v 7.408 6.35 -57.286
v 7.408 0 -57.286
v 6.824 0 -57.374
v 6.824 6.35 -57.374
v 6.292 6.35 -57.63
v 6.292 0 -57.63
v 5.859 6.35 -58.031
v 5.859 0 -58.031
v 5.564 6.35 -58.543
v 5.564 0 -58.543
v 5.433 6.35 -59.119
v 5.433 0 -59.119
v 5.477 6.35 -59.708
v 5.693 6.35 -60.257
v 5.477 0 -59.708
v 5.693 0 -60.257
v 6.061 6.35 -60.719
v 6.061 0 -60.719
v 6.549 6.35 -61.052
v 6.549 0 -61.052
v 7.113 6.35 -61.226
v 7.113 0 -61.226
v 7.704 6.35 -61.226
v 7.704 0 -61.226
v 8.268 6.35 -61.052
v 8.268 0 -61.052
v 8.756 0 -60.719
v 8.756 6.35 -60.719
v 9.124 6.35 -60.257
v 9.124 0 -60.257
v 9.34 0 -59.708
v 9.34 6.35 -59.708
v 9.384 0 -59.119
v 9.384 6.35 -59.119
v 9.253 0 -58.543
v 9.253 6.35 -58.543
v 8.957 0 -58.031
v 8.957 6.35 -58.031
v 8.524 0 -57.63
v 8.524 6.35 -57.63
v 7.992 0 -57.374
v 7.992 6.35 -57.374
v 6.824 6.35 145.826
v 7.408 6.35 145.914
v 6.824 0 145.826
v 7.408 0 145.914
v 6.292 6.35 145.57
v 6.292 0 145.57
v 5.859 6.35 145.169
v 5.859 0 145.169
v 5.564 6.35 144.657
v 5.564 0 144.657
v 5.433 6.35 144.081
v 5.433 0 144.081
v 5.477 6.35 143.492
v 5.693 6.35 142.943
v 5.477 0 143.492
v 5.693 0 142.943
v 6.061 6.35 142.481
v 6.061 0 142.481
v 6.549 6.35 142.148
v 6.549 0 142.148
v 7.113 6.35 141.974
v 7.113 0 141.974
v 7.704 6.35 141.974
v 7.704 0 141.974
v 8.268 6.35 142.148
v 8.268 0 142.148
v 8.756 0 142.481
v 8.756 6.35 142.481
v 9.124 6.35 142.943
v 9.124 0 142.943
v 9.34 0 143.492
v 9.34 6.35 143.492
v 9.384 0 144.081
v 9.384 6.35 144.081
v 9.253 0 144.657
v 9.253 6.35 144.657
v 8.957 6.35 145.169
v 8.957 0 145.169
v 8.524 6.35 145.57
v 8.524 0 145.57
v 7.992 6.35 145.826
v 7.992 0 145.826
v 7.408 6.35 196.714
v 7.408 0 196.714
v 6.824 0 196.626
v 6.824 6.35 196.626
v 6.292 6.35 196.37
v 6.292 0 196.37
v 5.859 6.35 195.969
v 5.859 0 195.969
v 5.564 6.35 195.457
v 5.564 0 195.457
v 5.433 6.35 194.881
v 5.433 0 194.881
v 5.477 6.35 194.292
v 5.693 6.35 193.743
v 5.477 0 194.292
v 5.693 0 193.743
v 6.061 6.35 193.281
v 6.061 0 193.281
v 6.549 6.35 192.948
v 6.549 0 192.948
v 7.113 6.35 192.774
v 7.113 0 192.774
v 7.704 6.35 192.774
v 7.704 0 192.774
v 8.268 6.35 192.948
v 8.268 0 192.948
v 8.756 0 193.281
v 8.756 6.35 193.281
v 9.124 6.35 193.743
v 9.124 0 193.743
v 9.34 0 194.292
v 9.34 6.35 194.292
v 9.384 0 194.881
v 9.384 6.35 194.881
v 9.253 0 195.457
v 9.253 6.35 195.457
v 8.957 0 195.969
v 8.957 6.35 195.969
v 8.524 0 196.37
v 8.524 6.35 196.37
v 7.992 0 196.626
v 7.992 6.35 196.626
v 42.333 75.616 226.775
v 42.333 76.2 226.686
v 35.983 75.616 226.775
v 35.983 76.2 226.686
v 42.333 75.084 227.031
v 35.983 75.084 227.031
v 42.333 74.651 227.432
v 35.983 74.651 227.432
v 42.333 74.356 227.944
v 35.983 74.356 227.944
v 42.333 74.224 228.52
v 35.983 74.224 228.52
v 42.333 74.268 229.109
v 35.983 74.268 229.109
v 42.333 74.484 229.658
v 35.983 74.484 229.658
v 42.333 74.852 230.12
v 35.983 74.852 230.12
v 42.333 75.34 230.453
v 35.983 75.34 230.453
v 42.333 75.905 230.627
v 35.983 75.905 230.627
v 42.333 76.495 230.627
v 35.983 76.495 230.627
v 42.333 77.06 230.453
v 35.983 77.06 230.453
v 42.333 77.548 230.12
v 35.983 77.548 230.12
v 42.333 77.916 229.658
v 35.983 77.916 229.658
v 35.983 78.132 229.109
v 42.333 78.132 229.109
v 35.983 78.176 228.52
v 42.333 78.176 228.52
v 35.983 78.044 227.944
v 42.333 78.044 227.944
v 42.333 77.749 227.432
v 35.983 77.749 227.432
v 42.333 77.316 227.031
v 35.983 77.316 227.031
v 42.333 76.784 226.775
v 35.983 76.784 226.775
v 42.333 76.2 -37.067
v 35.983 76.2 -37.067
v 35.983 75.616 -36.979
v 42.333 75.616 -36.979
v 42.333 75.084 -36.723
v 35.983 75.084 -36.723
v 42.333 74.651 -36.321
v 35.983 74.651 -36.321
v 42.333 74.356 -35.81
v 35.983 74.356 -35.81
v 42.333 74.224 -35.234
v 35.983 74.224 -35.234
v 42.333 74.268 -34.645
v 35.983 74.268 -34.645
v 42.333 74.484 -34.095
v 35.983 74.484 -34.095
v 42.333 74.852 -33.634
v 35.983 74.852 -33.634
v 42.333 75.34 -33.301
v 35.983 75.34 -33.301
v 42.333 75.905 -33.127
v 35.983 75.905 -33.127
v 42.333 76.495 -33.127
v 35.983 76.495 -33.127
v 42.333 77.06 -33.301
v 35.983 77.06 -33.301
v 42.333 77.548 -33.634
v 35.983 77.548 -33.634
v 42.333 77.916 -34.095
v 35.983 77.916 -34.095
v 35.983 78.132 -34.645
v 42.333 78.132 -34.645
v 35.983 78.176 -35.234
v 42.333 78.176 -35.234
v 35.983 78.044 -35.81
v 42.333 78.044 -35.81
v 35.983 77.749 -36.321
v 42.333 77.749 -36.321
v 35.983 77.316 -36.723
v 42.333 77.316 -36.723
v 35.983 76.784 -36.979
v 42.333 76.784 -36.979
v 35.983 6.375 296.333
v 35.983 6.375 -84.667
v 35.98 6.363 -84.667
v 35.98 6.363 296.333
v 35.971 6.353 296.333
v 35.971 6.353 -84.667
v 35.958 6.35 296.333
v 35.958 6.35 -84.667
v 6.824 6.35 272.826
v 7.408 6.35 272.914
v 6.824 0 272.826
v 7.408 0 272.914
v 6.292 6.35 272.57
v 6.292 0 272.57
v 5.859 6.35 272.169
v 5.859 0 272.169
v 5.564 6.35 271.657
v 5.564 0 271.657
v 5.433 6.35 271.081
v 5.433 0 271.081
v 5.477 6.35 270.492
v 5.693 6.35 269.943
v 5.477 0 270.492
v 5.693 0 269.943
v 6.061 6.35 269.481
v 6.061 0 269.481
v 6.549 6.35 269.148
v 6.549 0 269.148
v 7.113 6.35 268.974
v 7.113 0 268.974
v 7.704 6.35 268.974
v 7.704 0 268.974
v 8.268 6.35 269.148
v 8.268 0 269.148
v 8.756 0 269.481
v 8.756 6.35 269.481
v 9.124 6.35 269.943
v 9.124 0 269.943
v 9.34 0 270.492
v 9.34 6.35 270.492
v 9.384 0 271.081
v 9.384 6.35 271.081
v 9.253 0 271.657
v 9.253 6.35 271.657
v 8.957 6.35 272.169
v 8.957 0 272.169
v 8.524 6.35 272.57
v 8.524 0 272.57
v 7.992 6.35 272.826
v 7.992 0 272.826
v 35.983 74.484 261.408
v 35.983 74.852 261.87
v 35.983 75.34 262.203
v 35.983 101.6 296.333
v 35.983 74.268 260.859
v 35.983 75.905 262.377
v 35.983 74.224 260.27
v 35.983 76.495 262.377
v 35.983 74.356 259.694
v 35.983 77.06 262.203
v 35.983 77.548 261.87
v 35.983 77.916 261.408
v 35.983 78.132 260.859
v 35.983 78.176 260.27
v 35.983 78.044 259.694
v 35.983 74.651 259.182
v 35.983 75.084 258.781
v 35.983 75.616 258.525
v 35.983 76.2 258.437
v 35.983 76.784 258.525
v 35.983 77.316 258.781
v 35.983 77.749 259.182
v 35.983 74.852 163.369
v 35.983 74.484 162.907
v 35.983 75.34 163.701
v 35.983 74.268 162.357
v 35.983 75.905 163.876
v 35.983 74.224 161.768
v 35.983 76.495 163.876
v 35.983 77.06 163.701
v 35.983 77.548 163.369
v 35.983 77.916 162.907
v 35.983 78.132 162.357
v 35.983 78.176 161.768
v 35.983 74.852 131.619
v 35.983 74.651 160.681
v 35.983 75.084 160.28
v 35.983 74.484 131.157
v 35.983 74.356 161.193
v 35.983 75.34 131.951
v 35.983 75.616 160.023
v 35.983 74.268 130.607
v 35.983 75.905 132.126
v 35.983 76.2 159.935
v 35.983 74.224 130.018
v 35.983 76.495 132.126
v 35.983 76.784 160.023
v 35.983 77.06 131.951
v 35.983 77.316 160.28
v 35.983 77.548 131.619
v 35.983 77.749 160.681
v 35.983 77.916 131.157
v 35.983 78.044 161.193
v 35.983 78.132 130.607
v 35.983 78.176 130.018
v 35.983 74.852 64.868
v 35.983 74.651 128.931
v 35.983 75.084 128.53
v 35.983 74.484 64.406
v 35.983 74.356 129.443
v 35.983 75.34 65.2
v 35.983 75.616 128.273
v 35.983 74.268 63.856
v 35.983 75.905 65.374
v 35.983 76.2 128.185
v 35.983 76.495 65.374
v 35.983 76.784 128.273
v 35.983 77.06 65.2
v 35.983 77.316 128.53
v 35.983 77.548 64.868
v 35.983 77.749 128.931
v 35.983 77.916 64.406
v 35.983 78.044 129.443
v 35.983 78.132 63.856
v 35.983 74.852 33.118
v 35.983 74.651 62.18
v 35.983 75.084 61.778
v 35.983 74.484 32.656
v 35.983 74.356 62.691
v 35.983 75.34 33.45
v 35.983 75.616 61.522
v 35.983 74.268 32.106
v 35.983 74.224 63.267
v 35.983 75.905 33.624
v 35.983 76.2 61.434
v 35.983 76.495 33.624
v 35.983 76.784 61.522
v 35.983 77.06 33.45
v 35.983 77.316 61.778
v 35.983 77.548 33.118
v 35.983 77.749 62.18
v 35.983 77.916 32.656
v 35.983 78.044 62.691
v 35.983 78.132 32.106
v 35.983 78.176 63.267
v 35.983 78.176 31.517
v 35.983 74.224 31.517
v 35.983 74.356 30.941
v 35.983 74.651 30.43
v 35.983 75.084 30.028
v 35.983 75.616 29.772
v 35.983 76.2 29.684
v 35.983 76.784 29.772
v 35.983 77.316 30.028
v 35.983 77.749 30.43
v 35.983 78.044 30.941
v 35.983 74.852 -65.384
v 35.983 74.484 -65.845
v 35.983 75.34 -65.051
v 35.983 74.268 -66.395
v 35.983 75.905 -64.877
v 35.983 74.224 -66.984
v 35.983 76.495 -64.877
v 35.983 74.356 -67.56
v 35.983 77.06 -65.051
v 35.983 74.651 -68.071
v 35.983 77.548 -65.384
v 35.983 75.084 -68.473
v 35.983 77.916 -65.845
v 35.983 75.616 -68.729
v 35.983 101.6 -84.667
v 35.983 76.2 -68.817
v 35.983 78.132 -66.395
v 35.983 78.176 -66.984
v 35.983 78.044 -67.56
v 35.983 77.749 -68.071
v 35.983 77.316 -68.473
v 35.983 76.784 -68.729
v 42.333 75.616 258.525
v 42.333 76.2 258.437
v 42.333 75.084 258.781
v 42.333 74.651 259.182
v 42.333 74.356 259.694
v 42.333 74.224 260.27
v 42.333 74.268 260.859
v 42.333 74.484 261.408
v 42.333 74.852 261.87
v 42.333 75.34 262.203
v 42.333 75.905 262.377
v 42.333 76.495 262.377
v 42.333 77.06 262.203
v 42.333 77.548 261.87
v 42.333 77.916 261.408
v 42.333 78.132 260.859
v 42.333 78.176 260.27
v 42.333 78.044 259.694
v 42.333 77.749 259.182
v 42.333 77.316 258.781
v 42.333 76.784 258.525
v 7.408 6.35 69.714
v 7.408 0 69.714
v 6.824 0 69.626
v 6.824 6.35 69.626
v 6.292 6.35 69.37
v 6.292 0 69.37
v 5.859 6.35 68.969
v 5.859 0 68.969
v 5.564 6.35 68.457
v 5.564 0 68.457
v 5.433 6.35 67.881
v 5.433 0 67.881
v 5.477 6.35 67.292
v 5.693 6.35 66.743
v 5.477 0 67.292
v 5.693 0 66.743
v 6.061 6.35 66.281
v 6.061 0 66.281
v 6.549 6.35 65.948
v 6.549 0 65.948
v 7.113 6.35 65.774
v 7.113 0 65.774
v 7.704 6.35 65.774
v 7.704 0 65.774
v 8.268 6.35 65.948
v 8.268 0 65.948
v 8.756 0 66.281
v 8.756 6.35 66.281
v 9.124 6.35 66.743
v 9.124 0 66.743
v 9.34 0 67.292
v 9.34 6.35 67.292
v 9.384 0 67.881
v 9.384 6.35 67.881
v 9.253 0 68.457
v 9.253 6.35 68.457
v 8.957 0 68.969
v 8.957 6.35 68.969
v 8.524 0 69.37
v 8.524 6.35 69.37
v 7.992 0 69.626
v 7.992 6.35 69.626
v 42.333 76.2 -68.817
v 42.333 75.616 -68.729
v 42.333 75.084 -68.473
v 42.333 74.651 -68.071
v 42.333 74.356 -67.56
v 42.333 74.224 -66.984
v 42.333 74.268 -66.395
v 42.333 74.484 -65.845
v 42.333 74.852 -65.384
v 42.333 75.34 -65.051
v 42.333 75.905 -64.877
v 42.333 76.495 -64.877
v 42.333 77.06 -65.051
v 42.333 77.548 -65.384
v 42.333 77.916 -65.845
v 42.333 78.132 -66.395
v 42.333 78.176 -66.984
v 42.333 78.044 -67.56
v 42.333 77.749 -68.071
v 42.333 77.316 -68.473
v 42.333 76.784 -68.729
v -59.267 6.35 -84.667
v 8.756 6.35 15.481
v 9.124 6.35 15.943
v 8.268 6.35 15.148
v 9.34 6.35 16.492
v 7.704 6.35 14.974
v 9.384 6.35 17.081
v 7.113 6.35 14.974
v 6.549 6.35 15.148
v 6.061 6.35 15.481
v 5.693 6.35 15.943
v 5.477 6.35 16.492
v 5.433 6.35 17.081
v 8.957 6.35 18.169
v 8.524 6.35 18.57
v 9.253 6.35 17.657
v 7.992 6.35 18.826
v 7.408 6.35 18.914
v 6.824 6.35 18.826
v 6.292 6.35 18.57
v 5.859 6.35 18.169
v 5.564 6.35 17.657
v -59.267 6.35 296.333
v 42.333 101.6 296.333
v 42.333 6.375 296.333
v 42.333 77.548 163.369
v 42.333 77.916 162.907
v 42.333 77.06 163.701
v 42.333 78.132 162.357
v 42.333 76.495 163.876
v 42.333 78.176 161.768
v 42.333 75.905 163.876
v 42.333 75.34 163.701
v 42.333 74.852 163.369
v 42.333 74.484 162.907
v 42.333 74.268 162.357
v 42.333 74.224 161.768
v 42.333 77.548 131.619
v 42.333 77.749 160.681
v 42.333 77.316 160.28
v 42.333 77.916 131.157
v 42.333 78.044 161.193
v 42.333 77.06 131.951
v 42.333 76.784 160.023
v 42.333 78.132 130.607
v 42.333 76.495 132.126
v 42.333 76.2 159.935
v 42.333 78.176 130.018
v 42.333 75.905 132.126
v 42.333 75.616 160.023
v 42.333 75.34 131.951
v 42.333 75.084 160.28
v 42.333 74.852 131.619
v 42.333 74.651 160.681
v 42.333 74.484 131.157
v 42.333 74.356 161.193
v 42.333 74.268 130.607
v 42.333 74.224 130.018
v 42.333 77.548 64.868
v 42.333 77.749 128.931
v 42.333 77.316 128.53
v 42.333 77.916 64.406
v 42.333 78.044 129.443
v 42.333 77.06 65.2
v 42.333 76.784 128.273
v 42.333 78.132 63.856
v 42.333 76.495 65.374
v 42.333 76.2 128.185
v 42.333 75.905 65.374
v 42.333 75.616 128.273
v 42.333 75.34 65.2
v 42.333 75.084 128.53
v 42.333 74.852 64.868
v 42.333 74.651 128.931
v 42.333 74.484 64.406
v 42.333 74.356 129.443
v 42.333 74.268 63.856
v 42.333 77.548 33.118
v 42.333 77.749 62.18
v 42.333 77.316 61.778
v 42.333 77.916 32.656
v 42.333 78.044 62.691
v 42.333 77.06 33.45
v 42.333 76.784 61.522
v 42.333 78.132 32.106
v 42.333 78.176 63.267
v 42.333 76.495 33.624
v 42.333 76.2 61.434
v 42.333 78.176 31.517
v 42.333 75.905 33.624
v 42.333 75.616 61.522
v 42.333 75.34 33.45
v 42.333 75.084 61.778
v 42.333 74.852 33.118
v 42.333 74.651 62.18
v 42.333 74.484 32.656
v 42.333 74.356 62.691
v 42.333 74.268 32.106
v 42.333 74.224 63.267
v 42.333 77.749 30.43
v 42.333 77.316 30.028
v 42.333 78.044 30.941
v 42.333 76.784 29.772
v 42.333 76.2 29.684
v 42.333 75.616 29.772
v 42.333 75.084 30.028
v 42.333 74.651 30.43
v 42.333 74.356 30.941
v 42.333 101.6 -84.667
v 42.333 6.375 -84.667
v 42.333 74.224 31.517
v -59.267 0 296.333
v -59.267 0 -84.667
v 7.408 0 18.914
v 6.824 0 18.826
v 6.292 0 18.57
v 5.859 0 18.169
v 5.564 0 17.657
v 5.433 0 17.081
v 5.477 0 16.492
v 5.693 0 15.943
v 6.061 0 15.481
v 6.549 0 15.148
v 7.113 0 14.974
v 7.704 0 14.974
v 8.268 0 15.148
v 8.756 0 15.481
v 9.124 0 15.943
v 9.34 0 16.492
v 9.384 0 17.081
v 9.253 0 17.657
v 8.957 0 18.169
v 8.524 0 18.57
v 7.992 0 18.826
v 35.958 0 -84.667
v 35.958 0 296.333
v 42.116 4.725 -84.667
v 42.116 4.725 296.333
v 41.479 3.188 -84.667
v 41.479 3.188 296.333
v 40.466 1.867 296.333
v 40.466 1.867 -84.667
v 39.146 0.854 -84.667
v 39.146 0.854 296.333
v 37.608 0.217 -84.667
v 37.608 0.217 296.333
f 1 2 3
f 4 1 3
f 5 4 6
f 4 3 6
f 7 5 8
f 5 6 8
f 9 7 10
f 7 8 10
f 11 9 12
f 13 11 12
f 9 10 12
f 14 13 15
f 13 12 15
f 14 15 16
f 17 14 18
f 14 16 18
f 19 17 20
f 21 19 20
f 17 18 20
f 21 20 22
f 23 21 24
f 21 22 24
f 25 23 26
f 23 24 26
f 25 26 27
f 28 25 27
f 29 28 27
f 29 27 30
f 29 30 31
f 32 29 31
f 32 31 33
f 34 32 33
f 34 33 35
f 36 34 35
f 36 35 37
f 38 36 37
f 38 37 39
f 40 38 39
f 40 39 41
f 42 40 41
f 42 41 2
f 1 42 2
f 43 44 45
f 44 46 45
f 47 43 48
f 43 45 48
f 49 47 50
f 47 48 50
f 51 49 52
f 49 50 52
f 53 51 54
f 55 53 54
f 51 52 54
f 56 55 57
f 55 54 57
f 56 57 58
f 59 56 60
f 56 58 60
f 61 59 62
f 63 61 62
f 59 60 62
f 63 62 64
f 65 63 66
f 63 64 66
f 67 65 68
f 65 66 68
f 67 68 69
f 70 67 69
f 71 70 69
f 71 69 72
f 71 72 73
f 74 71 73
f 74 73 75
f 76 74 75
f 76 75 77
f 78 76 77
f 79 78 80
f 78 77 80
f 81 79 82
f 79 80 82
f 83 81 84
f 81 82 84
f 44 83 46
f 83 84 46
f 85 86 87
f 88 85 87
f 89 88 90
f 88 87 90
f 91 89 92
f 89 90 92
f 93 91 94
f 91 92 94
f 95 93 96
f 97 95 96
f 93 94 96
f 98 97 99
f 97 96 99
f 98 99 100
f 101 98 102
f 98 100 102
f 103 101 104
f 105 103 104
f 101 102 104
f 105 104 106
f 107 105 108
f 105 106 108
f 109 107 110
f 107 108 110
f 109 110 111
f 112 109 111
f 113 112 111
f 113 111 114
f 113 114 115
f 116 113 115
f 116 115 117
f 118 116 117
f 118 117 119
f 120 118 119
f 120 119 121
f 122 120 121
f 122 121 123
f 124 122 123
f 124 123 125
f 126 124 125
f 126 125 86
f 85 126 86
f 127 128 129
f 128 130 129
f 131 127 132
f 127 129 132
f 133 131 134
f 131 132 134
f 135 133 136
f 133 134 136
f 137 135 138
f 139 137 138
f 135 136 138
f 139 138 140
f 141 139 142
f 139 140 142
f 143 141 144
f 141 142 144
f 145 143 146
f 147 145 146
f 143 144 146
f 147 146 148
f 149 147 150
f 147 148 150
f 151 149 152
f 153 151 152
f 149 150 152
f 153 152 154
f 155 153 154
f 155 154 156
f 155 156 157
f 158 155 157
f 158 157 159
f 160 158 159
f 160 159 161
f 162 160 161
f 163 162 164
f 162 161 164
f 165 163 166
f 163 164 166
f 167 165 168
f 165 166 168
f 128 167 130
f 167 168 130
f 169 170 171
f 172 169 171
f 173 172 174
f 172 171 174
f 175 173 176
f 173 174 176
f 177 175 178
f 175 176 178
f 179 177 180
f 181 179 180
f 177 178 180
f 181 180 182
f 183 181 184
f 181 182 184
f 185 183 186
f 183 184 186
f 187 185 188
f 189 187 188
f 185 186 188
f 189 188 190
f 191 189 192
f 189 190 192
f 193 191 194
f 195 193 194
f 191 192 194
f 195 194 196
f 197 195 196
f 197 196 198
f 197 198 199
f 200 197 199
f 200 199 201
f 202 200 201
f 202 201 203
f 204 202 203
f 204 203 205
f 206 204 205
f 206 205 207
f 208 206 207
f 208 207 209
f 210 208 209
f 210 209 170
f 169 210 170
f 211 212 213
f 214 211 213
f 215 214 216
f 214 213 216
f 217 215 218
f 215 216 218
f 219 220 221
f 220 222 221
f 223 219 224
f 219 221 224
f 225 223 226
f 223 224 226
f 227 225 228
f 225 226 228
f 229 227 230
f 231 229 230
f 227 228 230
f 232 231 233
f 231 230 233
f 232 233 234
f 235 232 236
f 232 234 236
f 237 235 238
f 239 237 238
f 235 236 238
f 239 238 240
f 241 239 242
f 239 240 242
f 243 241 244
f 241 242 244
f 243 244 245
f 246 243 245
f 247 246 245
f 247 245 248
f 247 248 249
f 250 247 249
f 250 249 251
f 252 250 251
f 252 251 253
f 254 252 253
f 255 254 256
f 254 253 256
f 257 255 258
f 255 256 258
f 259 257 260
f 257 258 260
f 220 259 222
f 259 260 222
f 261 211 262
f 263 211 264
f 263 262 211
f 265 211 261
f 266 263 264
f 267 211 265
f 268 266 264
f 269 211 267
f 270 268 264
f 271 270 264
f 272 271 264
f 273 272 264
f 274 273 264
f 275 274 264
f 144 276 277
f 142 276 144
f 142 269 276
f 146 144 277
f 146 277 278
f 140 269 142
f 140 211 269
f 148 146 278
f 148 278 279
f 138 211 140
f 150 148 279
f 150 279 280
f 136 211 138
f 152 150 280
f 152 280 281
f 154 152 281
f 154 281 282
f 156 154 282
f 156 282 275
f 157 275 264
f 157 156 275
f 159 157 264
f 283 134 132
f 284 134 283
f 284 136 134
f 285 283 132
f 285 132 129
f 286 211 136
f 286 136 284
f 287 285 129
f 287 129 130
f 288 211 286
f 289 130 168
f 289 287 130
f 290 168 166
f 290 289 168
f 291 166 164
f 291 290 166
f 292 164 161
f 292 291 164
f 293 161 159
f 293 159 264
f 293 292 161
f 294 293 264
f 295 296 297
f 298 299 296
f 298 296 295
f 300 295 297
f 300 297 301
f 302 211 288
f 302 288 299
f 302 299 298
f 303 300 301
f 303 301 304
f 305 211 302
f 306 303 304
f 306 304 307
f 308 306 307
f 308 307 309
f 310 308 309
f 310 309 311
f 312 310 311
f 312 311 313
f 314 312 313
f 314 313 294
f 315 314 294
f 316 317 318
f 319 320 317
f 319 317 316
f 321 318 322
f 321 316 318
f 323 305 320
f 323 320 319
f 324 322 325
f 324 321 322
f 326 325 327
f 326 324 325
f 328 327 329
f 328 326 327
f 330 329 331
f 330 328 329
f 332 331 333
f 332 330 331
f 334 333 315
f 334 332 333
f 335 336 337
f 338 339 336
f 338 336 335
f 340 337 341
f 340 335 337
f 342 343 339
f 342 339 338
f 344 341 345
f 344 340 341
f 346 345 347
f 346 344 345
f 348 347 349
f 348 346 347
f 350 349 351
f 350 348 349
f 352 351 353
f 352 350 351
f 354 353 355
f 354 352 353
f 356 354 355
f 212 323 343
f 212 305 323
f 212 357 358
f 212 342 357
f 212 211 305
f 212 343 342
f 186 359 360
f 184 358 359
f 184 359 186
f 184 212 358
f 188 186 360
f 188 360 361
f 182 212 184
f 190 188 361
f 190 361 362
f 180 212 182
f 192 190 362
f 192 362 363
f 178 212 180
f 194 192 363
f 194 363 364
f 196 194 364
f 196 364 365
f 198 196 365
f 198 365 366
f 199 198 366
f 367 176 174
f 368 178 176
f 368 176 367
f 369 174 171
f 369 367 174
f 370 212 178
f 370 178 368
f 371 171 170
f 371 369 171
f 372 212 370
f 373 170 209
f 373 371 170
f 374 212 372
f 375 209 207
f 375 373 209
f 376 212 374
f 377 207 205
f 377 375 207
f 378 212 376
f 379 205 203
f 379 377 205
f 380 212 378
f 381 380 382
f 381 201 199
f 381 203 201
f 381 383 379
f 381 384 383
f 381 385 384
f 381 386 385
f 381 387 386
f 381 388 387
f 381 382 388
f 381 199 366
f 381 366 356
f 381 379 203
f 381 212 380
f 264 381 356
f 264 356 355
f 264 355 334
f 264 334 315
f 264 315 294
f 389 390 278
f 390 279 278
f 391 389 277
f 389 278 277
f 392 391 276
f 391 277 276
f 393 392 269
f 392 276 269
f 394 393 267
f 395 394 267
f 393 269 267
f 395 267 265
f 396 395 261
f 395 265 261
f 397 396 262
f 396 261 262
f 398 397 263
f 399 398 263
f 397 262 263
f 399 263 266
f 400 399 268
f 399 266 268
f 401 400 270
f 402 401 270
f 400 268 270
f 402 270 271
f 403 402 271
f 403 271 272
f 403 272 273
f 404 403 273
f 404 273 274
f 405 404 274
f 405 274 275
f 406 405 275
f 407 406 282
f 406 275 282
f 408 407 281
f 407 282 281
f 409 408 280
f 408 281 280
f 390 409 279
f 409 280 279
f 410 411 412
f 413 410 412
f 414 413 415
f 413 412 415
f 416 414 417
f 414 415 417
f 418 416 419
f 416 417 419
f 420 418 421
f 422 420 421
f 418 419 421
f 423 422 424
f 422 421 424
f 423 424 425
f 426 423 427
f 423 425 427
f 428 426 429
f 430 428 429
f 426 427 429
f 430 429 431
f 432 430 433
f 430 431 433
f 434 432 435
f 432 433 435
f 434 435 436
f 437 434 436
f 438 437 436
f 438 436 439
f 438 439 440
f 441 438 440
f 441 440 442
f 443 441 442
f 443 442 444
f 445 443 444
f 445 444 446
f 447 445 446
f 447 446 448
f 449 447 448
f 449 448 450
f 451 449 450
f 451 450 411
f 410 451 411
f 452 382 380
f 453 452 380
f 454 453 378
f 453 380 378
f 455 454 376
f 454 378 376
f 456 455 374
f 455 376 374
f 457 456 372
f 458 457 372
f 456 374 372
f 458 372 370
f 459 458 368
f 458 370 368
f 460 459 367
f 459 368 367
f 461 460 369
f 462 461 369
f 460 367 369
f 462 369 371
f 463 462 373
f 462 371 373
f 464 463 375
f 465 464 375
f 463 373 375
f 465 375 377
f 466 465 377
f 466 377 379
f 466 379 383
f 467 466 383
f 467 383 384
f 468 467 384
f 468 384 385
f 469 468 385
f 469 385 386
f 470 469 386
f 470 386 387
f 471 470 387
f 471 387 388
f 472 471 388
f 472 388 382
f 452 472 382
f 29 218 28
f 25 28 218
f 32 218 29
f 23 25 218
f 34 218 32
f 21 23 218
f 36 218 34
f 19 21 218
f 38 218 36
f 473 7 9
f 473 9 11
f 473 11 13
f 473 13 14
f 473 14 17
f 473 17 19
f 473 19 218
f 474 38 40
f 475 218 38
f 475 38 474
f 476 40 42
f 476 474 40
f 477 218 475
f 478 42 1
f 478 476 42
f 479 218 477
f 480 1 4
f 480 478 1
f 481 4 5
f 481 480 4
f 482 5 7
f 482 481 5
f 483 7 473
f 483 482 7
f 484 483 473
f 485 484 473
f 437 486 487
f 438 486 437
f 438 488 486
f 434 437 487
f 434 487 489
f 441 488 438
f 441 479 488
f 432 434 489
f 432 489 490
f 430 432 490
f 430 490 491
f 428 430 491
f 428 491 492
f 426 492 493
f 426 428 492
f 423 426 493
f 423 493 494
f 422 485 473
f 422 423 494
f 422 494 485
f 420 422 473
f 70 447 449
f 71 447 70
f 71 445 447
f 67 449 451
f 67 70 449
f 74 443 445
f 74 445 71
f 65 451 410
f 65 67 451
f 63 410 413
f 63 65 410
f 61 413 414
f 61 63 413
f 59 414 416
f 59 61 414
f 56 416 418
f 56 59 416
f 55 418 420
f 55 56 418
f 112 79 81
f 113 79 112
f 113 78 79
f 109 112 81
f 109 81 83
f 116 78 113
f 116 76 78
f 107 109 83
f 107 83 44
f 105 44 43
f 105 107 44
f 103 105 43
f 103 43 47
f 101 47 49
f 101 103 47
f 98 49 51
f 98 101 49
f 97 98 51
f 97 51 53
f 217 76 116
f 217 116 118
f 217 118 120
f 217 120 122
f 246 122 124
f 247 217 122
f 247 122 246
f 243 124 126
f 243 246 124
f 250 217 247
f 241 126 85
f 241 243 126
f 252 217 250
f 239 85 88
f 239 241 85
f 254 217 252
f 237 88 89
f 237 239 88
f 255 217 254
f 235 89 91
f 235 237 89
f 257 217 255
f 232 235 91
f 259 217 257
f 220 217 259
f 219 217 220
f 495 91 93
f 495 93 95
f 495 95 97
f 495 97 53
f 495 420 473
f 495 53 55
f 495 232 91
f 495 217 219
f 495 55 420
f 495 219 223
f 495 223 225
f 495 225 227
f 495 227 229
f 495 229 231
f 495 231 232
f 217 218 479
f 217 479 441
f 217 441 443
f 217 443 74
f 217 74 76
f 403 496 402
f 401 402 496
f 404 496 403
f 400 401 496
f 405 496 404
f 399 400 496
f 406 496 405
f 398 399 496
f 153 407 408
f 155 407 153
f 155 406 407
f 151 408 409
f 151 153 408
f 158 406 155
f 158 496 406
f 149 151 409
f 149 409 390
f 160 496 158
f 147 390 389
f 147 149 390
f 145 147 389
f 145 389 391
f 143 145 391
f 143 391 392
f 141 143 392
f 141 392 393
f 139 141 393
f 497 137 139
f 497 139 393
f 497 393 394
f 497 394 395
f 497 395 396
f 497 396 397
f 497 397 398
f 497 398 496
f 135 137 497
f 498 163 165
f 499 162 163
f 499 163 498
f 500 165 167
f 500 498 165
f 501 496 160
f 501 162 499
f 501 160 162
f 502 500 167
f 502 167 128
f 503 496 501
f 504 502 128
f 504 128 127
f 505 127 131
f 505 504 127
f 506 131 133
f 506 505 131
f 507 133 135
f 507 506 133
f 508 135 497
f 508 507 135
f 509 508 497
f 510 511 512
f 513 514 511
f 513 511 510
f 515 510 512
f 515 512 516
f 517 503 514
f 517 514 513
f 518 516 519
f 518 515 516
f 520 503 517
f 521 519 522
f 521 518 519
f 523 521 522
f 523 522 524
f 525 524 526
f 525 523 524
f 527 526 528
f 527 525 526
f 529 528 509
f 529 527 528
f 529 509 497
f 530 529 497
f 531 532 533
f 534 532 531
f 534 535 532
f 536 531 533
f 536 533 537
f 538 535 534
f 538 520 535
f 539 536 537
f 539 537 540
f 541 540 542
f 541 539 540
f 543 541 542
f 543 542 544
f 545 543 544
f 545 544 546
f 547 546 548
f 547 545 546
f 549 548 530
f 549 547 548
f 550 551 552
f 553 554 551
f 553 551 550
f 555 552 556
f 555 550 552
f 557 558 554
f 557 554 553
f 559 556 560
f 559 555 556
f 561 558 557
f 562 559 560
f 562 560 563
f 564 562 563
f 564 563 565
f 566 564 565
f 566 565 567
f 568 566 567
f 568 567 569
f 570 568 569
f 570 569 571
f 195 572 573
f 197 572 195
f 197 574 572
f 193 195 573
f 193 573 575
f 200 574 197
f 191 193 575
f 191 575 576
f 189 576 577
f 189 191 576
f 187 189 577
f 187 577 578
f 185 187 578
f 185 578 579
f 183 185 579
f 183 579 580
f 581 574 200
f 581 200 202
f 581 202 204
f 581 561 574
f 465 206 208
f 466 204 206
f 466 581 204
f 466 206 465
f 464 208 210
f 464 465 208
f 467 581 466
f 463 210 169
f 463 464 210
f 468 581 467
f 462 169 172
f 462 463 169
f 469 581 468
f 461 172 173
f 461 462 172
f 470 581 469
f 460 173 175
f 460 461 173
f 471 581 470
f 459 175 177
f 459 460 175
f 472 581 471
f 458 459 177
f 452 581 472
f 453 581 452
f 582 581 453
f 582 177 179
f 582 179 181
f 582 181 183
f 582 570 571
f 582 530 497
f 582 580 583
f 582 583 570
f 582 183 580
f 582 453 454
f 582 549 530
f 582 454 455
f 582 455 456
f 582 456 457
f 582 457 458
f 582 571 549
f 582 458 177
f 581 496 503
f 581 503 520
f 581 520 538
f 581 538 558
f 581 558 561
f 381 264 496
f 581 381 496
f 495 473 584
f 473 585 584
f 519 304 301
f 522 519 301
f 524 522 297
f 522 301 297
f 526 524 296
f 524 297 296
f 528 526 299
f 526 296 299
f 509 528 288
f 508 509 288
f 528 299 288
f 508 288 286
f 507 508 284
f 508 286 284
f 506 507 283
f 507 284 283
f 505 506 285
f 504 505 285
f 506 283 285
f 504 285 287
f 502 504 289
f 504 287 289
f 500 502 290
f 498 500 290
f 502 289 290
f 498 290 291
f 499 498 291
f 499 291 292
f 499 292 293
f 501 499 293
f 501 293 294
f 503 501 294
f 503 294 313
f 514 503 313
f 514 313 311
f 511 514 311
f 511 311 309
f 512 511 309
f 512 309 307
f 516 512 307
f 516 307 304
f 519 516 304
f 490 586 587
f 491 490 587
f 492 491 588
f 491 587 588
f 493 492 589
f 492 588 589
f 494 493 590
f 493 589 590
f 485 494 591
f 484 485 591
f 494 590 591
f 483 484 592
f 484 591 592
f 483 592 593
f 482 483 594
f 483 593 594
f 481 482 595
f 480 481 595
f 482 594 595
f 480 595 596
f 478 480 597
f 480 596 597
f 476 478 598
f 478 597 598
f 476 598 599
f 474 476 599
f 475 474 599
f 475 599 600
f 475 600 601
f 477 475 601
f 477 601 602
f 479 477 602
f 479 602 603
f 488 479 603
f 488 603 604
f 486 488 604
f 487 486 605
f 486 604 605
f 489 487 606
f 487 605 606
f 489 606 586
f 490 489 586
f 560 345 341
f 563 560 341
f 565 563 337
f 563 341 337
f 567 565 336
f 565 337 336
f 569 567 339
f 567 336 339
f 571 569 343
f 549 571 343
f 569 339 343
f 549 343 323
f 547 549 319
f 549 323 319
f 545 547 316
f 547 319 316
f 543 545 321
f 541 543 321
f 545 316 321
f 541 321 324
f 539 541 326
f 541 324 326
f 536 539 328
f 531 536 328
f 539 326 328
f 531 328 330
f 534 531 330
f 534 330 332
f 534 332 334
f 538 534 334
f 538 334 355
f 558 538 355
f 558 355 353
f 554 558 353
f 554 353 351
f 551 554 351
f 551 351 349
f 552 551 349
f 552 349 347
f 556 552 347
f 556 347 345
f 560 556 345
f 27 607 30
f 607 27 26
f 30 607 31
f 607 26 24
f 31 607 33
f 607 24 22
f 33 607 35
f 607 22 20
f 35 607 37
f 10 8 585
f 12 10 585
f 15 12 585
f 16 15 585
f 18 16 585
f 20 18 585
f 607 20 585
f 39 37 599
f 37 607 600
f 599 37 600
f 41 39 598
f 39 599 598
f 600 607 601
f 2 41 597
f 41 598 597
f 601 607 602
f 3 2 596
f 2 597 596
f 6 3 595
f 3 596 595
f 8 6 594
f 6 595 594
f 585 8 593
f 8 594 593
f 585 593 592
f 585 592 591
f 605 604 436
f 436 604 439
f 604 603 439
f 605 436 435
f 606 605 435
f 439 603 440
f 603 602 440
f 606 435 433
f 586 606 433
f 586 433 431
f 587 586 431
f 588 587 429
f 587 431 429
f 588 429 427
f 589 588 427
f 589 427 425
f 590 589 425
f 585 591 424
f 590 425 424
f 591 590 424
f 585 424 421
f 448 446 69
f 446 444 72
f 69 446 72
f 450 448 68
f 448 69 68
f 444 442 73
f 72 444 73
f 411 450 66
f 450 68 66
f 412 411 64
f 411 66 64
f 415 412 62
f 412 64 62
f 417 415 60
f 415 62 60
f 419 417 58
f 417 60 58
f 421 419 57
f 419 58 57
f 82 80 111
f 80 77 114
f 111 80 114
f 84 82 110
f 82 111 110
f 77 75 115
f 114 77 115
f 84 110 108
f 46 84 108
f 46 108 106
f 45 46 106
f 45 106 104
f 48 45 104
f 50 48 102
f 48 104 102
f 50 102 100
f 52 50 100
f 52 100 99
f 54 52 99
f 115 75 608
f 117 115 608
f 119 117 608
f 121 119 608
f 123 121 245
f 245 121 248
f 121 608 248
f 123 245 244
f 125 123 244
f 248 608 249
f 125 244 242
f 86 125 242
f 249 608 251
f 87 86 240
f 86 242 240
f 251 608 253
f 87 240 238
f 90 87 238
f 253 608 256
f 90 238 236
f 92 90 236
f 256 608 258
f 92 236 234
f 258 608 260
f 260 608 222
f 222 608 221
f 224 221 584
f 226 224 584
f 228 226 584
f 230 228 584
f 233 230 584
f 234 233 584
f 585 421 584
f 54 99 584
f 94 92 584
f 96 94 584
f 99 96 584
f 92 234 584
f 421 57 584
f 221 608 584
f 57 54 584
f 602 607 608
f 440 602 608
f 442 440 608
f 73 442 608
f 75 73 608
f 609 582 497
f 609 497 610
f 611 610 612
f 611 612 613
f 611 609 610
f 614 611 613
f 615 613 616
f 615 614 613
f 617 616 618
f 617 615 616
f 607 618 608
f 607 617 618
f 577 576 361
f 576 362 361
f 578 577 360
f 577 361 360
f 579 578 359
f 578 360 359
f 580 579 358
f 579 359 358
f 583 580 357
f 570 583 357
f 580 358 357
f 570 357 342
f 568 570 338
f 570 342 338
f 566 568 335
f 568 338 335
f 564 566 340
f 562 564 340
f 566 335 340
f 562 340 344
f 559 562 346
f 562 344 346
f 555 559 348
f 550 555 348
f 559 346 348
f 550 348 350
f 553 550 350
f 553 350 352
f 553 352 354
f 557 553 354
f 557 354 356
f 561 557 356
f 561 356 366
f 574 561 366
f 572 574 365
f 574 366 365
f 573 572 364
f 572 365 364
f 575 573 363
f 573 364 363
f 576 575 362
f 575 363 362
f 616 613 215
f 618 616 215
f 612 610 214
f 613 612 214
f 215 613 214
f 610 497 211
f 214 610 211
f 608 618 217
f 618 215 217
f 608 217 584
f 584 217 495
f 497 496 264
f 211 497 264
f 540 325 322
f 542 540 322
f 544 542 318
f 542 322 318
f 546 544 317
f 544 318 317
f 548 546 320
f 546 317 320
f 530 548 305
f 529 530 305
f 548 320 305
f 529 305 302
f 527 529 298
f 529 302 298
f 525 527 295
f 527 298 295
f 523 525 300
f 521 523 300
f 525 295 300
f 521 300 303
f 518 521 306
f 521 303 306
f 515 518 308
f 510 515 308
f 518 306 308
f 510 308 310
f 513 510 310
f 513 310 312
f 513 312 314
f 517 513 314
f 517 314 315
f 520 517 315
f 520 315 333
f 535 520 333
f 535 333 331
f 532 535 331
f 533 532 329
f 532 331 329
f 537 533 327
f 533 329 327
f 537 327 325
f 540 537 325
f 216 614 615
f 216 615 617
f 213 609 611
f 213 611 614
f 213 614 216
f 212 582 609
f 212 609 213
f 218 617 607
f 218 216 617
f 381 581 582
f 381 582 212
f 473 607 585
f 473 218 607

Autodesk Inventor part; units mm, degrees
ref_plane "YZ Plane" through (0, 0, 0) normal (1, 0, 0) x (0, 1, 0)
ref_plane "XZ Plane" through (0, 0, 0) normal (0, 1, 0) x (-1, 0, 0)
ref_plane "XY Plane" through (0, 0, 0) normal (0, 0, 1) x (1, 0, 0)
sketch "Sketch1" plane through (0, 0, 0) normal (0, 1, 0) x (-1, 0, 0)
  line L0 (59.2667, 296.3333) -> (-42.3333, 296.3333)
  line L1 (-42.3333, 296.3333) -> (-42.3333, -84.6667)
  line L2 (-42.3333, -84.6667) -> (59.2667, -84.6667)
  line L3 (59.2667, -84.6667) -> (59.2667, 296.3333)
  point P0 (0, 0)
  dimension "d0" = 101.6
  dimension "d1" = 381
extrude "Plate1" add sketch "Sketch1" along normal blind 6.35
sketch "Sketch2" plane through (35.9833, 0, -84.6667) normal (1, 0, 0) x (0, 1, 0)
  line L0 (0, 381) -> (0, 0)
  line L1 (0, 0) -> (101.6, 0)
  line L2 (101.6, 0) -> (101.6, 381)
  line L3 (101.6, 381) -> (0, 381)
edge flange "Flange1" height 101.6 angle 90 thickness 6.35 bend radius 0.0254 thickness toward (1, 0, 0) relief straight relief width 6.35 relief depth 3.175 edges at (42.3333, 6.35, 105.8333) wall of the first edge with corners at (35.9833, 0, 296.3333) (35.9833, 0, -84.6667) (35.9833, 101.6, -84.6667) (35.9833, 101.6, 296.3333)
bend "Bend1"
corner "Corner1"
sketch "Sketch3" plane through (42.3333, 101.6, 296.3333) normal (1, 0, 0) x (0, 0, -1)
  line L0 (20.0406, 0) -> (378.4346, 0) construction
  line L1 (378.4346, 0) -> (378.4346, -101.6) construction
  line L2 (378.4346, -101.6) -> (20.0406, -101.6) construction
  line L3 (20.0406, -101.6) -> (20.0406, 0) construction
  line L4 (0, -95.2246) -> (0, 0) construction
  line L5 (0, 0) -> (381, 0) construction
  line L6 (20.0406, 0) -> (83.5406, 0) construction
  line L7 (83.5406, 0) -> (83.5406, -95.25) construction
  line L8 (83.5406, -95.25) -> (20.0406, -95.25) construction
  line L9 (20.0406, -95.25) -> (20.0406, 0) construction
  line L10 (118.3386, 0) -> (181.8386, 0) construction
  line L11 (181.8386, 0) -> (181.8386, -95.25) construction
  line L12 (181.8386, -95.25) -> (118.3386, -95.25) construction
  line L13 (118.3386, -95.25) -> (118.3386, 0) construction
  line L14 (216.6366, 0) -> (280.1366, 0) construction
  line L15 (280.1366, 0) -> (280.1366, -95.25) construction
  line L16 (280.1366, -95.25) -> (216.6366, -95.25) construction
  line L17 (216.6366, -95.25) -> (216.6366, 0) construction
  line L18 (314.9346, 0) -> (378.4346, 0) construction
  line L19 (378.4346, 0) -> (378.4346, -95.25) construction
  line L20 (378.4346, -95.25) -> (314.9346, -95.25) construction
  line L21 (314.9346, -95.25) -> (314.9346, 0) construction
  line L22 (35.9156, -25.4) -> (67.6656, -25.4) construction
  line L23 (134.4168, -25.4) -> (166.1668, -25.4) construction
  line L24 (232.918, -25.4) -> (264.668, -25.4) construction
  line L25 (331.4192, -25.4) -> (363.1692, -25.4) construction
  point P0 (296.3333, -101.6)
  dimension "d13" = 358.394
  dimension "d14" = 20.0406
  dimension "d15" = 101.6
  dimension "d16" = 0
  dimension "d17" = 63.5
  dimension "d18" = 63.5
  dimension "d19" = 34.798
  dimension "d20" = 63.5
  dimension "d21" = 34.798
  dimension "d22" = 63.5
  dimension "d23" = 34.798
  dimension "d24" = 25.4
  dimension "d25" = 31.75
  dimension "d26" = 15.875
  dimension "d36" = 98.5012
hole "Hole1" at (42.3333, 76.2, 260.4177) at (42.3333, 76.2, 228.6677) at (42.3333, 76.2, 130.1665) at (42.3333, 76.2, 161.9165) at (42.3333, 76.2, 63.4153) at (42.3333, 76.2, 31.6653) at (42.3333, 76.2, -35.0859) at (42.3333, 76.2, -66.8359) direction (-1, 0, 0) diameter 3.9624 depth 13.6144 tip angle 118 thread size "10-32 UNF" class "2B" standard "ANSI Unified Screw Threads"
sketch "Sketch4" plane through (0, 6.35, 0) normal (0, 1, 0) x (1, 0, 0)
  line L0 (-59.2667, -296.3333) -> (-59.2667, 84.6667) projected
  line L1 (-59.2667, 84.6667) -> (35.9579, 84.6667) projected
  line L2 (42.3333, -296.3333) -> (42.3333, 84.6667) projected
  line L3 (35.9579, -296.3333) -> (-59.2667, -296.3333) projected
  point P0 (7.4083, 59.2667)
  point P1 (7.4083, -16.9333)
  point P2 (7.4083, -67.7333)
  point P3 (7.4083, -143.9333)
  point P4 (7.4083, -194.7333)
  point P5 (7.4083, -270.9333)
  dimension "d42" = 25.4
  dimension "d45" = 76.2
  dimension "d58" = 34.925
  dimension "d59" = 34.925
  dimension "d60" = 50.8
  dimension "d61" = 76.2
  dimension "d62" = 50.8
  dimension "d63" = 76.2
  dimension "d64" = 25.4
  dimension "d65" = 34.925
  dimension "d66" = 34.925
  dimension "d67" = 34.925
hole "Hole2" at (7.4083, 6.35, -59.2667) at (7.4083, 6.35, 16.9333) at (7.4083, 6.35, 67.7333) at (7.4083, 6.35, 143.9333) at (7.4083, 6.35, 194.7333) at (7.4083, 6.35, 270.9333) direction (0, -1, 0) diameter 3.9624 depth 13.6144 tip angle 118 thread size "10-32 UNF" class "2B" standard "ANSI Unified Screw Threads"
equation "\"d3\" = BendReliefWidth"
equation "\"d4\" = BendReliefDepth"
equation "\"d5\" = MinimumRemnant"
equation "\"d6\" = BendRadius"
equation "\"d10\" = CornerReliefSize"
equation "\"d11\" = GapSize"
equation "\"d12\" = JacobiRadiusSize"
equation "\"BendRadius\" = Thickness"
equation "\"BendReliefWidth\" = Thickness"
equation "\"BendReliefDepth\" = 0.5 * Thickness"
equation "\"CornerReliefSize\" = 4 * Thickness"
equation "\"MinimumRemnant\" = 2 * Thickness"
equation "\"TransitionRadius\" = BendRadius"
equation "\"JacobiRadiusSize\" = Thickness"
equation "\"GapSize\" = Thickness"
equation "\"d2\" = BendRadius"
equation "\"Thickness\" = 6.35"
properties part number "ubracket"
